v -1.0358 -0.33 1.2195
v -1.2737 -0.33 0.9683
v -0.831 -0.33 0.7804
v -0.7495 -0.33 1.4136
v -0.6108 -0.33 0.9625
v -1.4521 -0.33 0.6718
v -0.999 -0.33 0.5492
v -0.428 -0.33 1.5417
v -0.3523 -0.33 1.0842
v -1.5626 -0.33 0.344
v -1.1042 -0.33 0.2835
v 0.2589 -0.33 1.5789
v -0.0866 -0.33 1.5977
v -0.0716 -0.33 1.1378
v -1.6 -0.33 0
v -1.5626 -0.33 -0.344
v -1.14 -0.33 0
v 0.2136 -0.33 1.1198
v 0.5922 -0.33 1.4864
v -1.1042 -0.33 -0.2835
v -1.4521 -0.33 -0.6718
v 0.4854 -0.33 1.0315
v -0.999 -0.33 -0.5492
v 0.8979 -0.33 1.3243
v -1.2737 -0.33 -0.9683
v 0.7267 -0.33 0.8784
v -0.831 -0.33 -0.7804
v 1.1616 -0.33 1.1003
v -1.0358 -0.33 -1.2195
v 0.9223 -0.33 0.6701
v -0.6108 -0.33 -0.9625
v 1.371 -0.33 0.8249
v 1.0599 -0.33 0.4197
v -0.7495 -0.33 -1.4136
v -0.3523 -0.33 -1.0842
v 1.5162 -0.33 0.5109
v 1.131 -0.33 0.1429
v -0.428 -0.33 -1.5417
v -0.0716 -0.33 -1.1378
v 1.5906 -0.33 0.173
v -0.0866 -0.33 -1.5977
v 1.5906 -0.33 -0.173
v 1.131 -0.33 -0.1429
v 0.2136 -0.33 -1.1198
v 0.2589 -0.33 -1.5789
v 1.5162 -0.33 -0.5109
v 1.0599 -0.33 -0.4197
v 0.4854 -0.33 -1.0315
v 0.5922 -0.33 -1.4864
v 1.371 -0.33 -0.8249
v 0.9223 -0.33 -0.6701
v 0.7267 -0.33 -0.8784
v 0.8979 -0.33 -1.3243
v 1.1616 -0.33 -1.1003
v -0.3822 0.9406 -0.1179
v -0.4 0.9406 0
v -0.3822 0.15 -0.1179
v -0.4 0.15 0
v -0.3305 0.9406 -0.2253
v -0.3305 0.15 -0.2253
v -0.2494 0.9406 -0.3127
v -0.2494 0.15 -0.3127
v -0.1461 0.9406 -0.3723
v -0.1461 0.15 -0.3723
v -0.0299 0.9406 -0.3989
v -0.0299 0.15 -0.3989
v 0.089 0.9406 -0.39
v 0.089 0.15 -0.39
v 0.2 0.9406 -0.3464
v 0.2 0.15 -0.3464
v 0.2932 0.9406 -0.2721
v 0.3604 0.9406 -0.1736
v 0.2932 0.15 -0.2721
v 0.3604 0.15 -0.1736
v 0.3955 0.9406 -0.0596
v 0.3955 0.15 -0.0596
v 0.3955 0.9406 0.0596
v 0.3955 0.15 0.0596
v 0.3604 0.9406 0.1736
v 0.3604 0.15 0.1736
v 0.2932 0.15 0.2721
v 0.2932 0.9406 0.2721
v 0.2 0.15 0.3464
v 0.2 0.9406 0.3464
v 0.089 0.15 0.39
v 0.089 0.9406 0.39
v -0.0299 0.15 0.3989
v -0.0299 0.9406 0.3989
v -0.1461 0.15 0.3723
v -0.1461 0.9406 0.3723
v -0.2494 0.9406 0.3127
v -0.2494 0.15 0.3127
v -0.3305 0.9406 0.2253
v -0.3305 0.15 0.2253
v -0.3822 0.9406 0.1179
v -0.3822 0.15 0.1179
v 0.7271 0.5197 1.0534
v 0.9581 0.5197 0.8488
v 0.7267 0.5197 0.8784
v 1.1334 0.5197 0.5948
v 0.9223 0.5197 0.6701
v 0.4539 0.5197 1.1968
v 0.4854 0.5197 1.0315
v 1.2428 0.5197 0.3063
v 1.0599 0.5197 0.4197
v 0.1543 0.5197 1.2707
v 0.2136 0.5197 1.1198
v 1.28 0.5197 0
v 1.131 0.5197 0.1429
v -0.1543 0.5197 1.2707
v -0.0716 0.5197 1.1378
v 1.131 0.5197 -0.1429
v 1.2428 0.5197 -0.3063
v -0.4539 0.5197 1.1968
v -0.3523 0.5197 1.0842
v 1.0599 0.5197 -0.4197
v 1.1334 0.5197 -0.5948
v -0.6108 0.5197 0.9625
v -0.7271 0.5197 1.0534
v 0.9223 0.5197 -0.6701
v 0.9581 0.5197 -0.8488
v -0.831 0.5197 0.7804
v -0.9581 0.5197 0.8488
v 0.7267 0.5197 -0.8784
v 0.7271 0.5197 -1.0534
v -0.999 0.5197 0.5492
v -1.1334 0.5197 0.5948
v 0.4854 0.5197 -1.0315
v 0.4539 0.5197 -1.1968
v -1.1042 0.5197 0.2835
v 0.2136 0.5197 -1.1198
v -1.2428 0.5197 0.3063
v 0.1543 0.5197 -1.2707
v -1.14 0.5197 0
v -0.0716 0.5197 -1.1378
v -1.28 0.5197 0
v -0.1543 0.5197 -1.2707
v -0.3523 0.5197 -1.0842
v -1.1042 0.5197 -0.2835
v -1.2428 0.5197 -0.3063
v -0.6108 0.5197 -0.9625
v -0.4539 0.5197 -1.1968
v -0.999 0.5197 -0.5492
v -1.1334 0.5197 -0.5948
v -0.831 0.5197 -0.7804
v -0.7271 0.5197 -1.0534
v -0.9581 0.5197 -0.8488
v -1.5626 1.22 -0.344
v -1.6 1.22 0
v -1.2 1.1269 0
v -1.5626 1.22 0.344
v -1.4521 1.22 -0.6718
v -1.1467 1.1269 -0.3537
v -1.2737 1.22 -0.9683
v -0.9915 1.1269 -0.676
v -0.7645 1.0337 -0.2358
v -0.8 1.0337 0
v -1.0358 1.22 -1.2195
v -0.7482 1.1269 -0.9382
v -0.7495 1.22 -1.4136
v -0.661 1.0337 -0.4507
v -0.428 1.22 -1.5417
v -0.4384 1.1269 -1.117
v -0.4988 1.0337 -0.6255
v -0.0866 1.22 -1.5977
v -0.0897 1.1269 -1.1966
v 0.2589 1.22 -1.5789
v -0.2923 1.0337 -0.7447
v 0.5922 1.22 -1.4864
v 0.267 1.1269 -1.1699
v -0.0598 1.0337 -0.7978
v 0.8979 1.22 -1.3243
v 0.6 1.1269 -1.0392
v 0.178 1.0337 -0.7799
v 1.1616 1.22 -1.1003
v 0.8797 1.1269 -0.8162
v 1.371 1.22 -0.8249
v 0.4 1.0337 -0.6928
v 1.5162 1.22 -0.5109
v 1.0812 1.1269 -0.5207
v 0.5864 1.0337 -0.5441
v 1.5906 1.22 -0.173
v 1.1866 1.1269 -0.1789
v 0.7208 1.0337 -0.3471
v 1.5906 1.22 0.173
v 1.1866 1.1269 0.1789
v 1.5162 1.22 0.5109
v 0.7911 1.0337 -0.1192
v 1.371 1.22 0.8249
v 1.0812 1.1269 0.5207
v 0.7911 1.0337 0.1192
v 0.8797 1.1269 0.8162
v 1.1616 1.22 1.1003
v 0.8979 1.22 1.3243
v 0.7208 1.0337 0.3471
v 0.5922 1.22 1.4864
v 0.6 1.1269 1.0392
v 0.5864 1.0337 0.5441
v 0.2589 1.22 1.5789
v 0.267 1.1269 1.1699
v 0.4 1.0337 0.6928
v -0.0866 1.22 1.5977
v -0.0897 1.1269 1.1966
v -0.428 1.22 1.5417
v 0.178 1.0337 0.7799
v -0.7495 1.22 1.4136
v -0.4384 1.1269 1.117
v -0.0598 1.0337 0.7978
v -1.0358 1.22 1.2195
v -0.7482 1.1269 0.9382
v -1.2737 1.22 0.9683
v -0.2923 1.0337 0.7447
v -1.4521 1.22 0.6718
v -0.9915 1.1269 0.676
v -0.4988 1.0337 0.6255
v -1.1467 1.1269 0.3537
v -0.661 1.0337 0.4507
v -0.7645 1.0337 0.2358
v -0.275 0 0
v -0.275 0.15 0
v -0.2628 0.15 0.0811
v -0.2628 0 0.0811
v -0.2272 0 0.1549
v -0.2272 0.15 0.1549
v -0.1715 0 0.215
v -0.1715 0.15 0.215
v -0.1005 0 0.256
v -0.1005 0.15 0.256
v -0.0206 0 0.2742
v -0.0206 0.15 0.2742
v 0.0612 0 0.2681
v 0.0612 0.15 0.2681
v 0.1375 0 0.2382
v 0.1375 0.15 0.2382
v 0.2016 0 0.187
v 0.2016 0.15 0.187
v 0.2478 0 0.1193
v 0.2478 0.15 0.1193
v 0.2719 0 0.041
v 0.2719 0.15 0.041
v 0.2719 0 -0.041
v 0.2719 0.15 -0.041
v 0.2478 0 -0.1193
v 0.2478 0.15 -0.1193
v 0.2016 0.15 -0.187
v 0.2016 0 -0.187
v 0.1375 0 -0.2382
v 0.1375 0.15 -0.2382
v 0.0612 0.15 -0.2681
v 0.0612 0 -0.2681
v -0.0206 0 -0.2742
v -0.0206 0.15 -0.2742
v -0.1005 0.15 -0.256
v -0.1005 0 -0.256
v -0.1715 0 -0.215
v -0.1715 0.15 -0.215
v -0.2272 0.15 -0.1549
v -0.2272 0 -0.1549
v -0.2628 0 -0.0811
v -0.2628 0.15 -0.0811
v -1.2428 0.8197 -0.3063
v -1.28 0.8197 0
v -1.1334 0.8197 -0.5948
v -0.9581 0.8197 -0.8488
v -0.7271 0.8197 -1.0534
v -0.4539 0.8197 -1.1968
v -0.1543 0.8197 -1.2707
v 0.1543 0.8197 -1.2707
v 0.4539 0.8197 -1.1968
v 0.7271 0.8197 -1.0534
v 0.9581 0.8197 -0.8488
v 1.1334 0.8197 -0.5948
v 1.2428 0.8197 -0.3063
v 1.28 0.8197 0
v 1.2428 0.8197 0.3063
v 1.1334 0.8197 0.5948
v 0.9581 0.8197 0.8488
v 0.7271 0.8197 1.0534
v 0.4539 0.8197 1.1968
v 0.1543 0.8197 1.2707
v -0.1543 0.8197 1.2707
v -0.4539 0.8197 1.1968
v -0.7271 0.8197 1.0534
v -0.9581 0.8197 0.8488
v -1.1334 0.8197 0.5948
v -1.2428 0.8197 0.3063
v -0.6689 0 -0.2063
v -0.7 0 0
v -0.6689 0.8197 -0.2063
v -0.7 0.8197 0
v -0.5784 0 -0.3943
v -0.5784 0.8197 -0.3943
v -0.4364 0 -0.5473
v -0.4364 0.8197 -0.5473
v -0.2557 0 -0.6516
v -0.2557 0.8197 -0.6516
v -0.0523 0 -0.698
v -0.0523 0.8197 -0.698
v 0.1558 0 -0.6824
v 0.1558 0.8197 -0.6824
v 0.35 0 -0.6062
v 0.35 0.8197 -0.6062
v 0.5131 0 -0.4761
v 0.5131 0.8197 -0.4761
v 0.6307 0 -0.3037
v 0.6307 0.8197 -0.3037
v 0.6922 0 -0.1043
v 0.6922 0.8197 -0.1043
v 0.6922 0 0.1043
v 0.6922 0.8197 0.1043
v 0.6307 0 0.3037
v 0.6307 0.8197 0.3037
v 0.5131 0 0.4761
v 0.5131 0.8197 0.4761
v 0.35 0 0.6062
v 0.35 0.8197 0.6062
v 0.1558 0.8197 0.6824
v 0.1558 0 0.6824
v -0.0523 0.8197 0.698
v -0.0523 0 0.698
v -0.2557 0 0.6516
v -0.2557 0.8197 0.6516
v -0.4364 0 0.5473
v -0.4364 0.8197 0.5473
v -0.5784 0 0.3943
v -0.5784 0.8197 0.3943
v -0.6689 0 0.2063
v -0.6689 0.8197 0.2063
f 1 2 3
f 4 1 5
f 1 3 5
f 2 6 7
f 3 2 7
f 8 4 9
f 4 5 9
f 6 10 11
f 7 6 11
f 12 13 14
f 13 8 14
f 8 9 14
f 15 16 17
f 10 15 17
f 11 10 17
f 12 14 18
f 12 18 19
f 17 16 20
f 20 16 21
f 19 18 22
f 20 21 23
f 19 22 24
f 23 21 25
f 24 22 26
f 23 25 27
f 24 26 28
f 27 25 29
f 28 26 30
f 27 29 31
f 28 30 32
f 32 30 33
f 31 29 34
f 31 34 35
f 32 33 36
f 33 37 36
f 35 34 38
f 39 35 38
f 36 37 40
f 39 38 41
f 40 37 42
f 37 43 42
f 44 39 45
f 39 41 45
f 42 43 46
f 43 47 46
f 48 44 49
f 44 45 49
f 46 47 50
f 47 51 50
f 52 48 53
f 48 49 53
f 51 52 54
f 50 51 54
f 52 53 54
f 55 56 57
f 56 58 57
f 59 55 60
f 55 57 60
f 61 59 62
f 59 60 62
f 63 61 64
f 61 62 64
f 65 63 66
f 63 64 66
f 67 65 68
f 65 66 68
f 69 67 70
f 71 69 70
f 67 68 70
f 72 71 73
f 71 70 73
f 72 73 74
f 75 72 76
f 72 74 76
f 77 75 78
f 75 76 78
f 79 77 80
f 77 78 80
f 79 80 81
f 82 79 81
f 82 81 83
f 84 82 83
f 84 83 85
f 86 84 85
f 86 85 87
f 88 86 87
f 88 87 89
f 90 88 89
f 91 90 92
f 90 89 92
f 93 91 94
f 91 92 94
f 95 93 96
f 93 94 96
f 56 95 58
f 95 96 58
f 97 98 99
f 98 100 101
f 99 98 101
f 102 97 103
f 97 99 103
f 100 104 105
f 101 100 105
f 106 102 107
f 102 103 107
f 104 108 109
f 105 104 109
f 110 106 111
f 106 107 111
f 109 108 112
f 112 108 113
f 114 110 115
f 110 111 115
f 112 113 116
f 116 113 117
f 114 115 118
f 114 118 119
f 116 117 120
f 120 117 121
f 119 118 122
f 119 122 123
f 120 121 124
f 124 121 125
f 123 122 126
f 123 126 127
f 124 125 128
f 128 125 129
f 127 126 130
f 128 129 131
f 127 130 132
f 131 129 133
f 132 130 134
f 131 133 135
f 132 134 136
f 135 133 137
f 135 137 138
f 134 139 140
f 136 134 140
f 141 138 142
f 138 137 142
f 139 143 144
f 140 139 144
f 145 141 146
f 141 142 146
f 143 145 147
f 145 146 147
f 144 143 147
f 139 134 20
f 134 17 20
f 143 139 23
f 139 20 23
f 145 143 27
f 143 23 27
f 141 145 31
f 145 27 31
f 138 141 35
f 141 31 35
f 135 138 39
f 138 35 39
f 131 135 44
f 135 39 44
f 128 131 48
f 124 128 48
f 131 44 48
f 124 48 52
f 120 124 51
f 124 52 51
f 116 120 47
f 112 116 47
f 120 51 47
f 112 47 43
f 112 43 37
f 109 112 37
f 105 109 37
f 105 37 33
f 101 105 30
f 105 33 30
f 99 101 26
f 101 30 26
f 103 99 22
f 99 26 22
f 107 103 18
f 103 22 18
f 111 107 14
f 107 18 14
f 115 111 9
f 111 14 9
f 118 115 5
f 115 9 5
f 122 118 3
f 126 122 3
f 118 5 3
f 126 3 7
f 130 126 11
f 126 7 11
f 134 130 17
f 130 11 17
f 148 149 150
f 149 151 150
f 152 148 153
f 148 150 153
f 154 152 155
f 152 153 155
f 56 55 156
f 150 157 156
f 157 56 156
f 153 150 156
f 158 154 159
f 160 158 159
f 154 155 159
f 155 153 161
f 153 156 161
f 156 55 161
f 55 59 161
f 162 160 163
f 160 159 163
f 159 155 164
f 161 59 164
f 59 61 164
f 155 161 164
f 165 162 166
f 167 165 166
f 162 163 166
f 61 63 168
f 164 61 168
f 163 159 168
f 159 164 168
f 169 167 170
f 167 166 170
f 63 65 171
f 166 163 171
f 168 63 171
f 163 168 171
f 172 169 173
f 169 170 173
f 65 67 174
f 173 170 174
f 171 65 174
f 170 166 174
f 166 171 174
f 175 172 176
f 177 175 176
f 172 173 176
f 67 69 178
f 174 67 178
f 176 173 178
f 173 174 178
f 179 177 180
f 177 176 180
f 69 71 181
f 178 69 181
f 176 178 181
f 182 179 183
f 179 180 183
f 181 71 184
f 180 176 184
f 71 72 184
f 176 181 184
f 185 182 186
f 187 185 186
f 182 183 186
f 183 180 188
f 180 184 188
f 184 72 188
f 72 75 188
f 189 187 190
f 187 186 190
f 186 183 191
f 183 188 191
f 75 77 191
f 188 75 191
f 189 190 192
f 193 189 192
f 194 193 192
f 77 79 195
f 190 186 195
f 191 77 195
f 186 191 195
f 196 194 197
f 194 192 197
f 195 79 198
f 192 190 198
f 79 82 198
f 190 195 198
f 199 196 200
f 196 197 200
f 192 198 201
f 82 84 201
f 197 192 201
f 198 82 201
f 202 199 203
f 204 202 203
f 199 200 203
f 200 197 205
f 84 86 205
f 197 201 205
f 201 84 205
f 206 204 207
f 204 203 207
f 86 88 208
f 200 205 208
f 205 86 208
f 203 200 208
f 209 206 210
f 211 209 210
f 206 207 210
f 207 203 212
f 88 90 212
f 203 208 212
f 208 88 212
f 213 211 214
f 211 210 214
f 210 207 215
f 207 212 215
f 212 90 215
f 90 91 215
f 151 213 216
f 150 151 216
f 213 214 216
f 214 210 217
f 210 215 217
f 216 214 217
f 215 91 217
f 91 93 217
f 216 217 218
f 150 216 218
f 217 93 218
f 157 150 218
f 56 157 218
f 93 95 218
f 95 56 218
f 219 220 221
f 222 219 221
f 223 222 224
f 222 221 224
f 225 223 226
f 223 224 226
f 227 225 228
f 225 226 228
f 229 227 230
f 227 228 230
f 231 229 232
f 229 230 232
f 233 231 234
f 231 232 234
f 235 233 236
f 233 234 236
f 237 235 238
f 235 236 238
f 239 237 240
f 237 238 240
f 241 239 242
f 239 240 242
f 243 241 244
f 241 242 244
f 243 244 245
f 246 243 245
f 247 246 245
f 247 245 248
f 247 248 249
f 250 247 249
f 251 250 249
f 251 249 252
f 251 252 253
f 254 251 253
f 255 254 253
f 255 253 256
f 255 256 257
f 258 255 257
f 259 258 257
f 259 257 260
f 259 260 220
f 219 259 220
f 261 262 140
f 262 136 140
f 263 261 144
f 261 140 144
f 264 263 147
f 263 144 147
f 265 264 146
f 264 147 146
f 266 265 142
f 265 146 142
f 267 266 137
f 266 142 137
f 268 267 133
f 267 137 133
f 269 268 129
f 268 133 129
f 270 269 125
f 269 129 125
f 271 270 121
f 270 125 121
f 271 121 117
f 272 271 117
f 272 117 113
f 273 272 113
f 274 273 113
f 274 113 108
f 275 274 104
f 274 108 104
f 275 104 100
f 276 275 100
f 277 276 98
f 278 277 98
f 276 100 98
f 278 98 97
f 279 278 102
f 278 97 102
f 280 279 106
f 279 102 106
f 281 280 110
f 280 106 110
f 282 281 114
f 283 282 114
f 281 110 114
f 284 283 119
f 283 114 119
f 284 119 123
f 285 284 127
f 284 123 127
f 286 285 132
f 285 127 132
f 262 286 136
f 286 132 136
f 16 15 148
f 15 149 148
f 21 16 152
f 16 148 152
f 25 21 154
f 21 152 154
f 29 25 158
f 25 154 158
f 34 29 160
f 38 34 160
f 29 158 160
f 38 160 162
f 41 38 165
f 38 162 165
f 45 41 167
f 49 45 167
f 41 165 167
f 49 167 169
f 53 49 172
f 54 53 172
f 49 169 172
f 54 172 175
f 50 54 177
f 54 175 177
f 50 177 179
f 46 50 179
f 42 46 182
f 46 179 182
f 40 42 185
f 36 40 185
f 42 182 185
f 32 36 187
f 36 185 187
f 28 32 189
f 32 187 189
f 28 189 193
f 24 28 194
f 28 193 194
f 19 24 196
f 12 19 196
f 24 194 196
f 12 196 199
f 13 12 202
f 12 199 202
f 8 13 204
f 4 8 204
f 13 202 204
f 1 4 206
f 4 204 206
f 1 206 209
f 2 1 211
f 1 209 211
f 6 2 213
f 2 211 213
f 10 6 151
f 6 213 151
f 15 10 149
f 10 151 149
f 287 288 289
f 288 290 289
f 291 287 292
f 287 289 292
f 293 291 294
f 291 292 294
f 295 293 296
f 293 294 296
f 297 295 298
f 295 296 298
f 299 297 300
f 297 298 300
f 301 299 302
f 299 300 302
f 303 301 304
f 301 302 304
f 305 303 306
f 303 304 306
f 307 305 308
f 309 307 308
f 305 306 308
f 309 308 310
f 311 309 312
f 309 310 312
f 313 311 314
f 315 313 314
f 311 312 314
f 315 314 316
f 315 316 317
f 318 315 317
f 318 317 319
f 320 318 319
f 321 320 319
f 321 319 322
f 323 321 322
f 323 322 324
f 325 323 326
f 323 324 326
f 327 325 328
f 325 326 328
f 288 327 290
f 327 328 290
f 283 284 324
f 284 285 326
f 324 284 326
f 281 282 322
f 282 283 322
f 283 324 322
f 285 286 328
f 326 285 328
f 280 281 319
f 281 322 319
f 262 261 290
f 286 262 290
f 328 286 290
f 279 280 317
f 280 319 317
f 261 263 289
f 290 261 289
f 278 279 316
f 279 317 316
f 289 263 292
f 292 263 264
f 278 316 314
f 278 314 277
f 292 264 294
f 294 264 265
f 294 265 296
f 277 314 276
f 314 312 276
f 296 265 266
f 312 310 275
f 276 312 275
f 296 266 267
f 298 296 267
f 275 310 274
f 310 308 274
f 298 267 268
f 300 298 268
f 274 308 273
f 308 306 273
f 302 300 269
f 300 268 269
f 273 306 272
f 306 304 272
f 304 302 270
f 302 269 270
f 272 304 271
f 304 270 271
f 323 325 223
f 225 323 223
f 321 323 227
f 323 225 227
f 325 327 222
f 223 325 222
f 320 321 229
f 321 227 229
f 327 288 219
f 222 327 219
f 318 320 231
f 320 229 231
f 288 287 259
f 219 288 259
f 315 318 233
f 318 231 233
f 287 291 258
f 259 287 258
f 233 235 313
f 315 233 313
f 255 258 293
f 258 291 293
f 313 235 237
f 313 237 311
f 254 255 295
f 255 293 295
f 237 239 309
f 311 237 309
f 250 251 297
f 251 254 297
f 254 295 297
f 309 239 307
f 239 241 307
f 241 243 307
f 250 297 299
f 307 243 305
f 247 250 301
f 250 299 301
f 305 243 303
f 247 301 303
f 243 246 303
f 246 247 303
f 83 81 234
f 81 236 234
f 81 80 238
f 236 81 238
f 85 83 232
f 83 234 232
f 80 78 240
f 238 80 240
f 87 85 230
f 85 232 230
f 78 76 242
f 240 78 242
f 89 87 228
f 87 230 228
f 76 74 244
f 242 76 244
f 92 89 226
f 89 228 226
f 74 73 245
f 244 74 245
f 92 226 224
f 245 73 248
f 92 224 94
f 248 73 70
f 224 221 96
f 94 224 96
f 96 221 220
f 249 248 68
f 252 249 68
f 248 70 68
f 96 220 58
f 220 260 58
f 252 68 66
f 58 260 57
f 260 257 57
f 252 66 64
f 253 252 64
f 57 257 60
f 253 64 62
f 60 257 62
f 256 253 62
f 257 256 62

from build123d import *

# Parameters (mm, degrees)
CUT_EXTRUDE_1_REACH = 4.503
SKETCH_2_R          = 0.275


with BuildPart() as part:
    # 草图1 → 旋转1 (revolve)
    with BuildSketch(Plane.XY, mode=Mode.PRIVATE) as revolve_1_sk:
        Polygon((0, 0), (0.7, 0), (0.7, 0.819692267), (1.14, 0.819692267), (1.28, 0.819692267), (1.28, 0.519692267), (1.14, 0.519692267), (1.14, -0.33), (1.6, -0.33), (1.6, 1.22), (0.4, 0.94056338), (0.4, 0.15), (0, 0.15), align=None)
    revolve(revolve_1_sk.sketch.rotate(Axis((0, 0.15, 0), (0, -1, 0)), 180), axis=Axis((0, 0.15, 0), (0, -1, 0)))

    # 草图2 → 切除-拉伸1 (cut, up to next)
    with BuildSketch(Plane(origin=(0, 0.15, 0), x_dir=(1, 0, 0), z_dir=(0, 1, 0)), mode=Mode.PRIVATE) as cut_extrude_1_sk1:
        with Locations(Location((0, 0, 0), (0, 0, 180))):
            Circle(SKETCH_2_R)
    cut_extrude_1_tool1 = extrude(cut_extrude_1_sk1.sketch, amount=-CUT_EXTRUDE_1_REACH, mode=Mode.PRIVATE) & part.part
    add(cut_extrude_1_tool1.solids().sort_by_distance((0, 0.15, 0))[0], mode=Mode.SUBTRACT)


solid = part.part
